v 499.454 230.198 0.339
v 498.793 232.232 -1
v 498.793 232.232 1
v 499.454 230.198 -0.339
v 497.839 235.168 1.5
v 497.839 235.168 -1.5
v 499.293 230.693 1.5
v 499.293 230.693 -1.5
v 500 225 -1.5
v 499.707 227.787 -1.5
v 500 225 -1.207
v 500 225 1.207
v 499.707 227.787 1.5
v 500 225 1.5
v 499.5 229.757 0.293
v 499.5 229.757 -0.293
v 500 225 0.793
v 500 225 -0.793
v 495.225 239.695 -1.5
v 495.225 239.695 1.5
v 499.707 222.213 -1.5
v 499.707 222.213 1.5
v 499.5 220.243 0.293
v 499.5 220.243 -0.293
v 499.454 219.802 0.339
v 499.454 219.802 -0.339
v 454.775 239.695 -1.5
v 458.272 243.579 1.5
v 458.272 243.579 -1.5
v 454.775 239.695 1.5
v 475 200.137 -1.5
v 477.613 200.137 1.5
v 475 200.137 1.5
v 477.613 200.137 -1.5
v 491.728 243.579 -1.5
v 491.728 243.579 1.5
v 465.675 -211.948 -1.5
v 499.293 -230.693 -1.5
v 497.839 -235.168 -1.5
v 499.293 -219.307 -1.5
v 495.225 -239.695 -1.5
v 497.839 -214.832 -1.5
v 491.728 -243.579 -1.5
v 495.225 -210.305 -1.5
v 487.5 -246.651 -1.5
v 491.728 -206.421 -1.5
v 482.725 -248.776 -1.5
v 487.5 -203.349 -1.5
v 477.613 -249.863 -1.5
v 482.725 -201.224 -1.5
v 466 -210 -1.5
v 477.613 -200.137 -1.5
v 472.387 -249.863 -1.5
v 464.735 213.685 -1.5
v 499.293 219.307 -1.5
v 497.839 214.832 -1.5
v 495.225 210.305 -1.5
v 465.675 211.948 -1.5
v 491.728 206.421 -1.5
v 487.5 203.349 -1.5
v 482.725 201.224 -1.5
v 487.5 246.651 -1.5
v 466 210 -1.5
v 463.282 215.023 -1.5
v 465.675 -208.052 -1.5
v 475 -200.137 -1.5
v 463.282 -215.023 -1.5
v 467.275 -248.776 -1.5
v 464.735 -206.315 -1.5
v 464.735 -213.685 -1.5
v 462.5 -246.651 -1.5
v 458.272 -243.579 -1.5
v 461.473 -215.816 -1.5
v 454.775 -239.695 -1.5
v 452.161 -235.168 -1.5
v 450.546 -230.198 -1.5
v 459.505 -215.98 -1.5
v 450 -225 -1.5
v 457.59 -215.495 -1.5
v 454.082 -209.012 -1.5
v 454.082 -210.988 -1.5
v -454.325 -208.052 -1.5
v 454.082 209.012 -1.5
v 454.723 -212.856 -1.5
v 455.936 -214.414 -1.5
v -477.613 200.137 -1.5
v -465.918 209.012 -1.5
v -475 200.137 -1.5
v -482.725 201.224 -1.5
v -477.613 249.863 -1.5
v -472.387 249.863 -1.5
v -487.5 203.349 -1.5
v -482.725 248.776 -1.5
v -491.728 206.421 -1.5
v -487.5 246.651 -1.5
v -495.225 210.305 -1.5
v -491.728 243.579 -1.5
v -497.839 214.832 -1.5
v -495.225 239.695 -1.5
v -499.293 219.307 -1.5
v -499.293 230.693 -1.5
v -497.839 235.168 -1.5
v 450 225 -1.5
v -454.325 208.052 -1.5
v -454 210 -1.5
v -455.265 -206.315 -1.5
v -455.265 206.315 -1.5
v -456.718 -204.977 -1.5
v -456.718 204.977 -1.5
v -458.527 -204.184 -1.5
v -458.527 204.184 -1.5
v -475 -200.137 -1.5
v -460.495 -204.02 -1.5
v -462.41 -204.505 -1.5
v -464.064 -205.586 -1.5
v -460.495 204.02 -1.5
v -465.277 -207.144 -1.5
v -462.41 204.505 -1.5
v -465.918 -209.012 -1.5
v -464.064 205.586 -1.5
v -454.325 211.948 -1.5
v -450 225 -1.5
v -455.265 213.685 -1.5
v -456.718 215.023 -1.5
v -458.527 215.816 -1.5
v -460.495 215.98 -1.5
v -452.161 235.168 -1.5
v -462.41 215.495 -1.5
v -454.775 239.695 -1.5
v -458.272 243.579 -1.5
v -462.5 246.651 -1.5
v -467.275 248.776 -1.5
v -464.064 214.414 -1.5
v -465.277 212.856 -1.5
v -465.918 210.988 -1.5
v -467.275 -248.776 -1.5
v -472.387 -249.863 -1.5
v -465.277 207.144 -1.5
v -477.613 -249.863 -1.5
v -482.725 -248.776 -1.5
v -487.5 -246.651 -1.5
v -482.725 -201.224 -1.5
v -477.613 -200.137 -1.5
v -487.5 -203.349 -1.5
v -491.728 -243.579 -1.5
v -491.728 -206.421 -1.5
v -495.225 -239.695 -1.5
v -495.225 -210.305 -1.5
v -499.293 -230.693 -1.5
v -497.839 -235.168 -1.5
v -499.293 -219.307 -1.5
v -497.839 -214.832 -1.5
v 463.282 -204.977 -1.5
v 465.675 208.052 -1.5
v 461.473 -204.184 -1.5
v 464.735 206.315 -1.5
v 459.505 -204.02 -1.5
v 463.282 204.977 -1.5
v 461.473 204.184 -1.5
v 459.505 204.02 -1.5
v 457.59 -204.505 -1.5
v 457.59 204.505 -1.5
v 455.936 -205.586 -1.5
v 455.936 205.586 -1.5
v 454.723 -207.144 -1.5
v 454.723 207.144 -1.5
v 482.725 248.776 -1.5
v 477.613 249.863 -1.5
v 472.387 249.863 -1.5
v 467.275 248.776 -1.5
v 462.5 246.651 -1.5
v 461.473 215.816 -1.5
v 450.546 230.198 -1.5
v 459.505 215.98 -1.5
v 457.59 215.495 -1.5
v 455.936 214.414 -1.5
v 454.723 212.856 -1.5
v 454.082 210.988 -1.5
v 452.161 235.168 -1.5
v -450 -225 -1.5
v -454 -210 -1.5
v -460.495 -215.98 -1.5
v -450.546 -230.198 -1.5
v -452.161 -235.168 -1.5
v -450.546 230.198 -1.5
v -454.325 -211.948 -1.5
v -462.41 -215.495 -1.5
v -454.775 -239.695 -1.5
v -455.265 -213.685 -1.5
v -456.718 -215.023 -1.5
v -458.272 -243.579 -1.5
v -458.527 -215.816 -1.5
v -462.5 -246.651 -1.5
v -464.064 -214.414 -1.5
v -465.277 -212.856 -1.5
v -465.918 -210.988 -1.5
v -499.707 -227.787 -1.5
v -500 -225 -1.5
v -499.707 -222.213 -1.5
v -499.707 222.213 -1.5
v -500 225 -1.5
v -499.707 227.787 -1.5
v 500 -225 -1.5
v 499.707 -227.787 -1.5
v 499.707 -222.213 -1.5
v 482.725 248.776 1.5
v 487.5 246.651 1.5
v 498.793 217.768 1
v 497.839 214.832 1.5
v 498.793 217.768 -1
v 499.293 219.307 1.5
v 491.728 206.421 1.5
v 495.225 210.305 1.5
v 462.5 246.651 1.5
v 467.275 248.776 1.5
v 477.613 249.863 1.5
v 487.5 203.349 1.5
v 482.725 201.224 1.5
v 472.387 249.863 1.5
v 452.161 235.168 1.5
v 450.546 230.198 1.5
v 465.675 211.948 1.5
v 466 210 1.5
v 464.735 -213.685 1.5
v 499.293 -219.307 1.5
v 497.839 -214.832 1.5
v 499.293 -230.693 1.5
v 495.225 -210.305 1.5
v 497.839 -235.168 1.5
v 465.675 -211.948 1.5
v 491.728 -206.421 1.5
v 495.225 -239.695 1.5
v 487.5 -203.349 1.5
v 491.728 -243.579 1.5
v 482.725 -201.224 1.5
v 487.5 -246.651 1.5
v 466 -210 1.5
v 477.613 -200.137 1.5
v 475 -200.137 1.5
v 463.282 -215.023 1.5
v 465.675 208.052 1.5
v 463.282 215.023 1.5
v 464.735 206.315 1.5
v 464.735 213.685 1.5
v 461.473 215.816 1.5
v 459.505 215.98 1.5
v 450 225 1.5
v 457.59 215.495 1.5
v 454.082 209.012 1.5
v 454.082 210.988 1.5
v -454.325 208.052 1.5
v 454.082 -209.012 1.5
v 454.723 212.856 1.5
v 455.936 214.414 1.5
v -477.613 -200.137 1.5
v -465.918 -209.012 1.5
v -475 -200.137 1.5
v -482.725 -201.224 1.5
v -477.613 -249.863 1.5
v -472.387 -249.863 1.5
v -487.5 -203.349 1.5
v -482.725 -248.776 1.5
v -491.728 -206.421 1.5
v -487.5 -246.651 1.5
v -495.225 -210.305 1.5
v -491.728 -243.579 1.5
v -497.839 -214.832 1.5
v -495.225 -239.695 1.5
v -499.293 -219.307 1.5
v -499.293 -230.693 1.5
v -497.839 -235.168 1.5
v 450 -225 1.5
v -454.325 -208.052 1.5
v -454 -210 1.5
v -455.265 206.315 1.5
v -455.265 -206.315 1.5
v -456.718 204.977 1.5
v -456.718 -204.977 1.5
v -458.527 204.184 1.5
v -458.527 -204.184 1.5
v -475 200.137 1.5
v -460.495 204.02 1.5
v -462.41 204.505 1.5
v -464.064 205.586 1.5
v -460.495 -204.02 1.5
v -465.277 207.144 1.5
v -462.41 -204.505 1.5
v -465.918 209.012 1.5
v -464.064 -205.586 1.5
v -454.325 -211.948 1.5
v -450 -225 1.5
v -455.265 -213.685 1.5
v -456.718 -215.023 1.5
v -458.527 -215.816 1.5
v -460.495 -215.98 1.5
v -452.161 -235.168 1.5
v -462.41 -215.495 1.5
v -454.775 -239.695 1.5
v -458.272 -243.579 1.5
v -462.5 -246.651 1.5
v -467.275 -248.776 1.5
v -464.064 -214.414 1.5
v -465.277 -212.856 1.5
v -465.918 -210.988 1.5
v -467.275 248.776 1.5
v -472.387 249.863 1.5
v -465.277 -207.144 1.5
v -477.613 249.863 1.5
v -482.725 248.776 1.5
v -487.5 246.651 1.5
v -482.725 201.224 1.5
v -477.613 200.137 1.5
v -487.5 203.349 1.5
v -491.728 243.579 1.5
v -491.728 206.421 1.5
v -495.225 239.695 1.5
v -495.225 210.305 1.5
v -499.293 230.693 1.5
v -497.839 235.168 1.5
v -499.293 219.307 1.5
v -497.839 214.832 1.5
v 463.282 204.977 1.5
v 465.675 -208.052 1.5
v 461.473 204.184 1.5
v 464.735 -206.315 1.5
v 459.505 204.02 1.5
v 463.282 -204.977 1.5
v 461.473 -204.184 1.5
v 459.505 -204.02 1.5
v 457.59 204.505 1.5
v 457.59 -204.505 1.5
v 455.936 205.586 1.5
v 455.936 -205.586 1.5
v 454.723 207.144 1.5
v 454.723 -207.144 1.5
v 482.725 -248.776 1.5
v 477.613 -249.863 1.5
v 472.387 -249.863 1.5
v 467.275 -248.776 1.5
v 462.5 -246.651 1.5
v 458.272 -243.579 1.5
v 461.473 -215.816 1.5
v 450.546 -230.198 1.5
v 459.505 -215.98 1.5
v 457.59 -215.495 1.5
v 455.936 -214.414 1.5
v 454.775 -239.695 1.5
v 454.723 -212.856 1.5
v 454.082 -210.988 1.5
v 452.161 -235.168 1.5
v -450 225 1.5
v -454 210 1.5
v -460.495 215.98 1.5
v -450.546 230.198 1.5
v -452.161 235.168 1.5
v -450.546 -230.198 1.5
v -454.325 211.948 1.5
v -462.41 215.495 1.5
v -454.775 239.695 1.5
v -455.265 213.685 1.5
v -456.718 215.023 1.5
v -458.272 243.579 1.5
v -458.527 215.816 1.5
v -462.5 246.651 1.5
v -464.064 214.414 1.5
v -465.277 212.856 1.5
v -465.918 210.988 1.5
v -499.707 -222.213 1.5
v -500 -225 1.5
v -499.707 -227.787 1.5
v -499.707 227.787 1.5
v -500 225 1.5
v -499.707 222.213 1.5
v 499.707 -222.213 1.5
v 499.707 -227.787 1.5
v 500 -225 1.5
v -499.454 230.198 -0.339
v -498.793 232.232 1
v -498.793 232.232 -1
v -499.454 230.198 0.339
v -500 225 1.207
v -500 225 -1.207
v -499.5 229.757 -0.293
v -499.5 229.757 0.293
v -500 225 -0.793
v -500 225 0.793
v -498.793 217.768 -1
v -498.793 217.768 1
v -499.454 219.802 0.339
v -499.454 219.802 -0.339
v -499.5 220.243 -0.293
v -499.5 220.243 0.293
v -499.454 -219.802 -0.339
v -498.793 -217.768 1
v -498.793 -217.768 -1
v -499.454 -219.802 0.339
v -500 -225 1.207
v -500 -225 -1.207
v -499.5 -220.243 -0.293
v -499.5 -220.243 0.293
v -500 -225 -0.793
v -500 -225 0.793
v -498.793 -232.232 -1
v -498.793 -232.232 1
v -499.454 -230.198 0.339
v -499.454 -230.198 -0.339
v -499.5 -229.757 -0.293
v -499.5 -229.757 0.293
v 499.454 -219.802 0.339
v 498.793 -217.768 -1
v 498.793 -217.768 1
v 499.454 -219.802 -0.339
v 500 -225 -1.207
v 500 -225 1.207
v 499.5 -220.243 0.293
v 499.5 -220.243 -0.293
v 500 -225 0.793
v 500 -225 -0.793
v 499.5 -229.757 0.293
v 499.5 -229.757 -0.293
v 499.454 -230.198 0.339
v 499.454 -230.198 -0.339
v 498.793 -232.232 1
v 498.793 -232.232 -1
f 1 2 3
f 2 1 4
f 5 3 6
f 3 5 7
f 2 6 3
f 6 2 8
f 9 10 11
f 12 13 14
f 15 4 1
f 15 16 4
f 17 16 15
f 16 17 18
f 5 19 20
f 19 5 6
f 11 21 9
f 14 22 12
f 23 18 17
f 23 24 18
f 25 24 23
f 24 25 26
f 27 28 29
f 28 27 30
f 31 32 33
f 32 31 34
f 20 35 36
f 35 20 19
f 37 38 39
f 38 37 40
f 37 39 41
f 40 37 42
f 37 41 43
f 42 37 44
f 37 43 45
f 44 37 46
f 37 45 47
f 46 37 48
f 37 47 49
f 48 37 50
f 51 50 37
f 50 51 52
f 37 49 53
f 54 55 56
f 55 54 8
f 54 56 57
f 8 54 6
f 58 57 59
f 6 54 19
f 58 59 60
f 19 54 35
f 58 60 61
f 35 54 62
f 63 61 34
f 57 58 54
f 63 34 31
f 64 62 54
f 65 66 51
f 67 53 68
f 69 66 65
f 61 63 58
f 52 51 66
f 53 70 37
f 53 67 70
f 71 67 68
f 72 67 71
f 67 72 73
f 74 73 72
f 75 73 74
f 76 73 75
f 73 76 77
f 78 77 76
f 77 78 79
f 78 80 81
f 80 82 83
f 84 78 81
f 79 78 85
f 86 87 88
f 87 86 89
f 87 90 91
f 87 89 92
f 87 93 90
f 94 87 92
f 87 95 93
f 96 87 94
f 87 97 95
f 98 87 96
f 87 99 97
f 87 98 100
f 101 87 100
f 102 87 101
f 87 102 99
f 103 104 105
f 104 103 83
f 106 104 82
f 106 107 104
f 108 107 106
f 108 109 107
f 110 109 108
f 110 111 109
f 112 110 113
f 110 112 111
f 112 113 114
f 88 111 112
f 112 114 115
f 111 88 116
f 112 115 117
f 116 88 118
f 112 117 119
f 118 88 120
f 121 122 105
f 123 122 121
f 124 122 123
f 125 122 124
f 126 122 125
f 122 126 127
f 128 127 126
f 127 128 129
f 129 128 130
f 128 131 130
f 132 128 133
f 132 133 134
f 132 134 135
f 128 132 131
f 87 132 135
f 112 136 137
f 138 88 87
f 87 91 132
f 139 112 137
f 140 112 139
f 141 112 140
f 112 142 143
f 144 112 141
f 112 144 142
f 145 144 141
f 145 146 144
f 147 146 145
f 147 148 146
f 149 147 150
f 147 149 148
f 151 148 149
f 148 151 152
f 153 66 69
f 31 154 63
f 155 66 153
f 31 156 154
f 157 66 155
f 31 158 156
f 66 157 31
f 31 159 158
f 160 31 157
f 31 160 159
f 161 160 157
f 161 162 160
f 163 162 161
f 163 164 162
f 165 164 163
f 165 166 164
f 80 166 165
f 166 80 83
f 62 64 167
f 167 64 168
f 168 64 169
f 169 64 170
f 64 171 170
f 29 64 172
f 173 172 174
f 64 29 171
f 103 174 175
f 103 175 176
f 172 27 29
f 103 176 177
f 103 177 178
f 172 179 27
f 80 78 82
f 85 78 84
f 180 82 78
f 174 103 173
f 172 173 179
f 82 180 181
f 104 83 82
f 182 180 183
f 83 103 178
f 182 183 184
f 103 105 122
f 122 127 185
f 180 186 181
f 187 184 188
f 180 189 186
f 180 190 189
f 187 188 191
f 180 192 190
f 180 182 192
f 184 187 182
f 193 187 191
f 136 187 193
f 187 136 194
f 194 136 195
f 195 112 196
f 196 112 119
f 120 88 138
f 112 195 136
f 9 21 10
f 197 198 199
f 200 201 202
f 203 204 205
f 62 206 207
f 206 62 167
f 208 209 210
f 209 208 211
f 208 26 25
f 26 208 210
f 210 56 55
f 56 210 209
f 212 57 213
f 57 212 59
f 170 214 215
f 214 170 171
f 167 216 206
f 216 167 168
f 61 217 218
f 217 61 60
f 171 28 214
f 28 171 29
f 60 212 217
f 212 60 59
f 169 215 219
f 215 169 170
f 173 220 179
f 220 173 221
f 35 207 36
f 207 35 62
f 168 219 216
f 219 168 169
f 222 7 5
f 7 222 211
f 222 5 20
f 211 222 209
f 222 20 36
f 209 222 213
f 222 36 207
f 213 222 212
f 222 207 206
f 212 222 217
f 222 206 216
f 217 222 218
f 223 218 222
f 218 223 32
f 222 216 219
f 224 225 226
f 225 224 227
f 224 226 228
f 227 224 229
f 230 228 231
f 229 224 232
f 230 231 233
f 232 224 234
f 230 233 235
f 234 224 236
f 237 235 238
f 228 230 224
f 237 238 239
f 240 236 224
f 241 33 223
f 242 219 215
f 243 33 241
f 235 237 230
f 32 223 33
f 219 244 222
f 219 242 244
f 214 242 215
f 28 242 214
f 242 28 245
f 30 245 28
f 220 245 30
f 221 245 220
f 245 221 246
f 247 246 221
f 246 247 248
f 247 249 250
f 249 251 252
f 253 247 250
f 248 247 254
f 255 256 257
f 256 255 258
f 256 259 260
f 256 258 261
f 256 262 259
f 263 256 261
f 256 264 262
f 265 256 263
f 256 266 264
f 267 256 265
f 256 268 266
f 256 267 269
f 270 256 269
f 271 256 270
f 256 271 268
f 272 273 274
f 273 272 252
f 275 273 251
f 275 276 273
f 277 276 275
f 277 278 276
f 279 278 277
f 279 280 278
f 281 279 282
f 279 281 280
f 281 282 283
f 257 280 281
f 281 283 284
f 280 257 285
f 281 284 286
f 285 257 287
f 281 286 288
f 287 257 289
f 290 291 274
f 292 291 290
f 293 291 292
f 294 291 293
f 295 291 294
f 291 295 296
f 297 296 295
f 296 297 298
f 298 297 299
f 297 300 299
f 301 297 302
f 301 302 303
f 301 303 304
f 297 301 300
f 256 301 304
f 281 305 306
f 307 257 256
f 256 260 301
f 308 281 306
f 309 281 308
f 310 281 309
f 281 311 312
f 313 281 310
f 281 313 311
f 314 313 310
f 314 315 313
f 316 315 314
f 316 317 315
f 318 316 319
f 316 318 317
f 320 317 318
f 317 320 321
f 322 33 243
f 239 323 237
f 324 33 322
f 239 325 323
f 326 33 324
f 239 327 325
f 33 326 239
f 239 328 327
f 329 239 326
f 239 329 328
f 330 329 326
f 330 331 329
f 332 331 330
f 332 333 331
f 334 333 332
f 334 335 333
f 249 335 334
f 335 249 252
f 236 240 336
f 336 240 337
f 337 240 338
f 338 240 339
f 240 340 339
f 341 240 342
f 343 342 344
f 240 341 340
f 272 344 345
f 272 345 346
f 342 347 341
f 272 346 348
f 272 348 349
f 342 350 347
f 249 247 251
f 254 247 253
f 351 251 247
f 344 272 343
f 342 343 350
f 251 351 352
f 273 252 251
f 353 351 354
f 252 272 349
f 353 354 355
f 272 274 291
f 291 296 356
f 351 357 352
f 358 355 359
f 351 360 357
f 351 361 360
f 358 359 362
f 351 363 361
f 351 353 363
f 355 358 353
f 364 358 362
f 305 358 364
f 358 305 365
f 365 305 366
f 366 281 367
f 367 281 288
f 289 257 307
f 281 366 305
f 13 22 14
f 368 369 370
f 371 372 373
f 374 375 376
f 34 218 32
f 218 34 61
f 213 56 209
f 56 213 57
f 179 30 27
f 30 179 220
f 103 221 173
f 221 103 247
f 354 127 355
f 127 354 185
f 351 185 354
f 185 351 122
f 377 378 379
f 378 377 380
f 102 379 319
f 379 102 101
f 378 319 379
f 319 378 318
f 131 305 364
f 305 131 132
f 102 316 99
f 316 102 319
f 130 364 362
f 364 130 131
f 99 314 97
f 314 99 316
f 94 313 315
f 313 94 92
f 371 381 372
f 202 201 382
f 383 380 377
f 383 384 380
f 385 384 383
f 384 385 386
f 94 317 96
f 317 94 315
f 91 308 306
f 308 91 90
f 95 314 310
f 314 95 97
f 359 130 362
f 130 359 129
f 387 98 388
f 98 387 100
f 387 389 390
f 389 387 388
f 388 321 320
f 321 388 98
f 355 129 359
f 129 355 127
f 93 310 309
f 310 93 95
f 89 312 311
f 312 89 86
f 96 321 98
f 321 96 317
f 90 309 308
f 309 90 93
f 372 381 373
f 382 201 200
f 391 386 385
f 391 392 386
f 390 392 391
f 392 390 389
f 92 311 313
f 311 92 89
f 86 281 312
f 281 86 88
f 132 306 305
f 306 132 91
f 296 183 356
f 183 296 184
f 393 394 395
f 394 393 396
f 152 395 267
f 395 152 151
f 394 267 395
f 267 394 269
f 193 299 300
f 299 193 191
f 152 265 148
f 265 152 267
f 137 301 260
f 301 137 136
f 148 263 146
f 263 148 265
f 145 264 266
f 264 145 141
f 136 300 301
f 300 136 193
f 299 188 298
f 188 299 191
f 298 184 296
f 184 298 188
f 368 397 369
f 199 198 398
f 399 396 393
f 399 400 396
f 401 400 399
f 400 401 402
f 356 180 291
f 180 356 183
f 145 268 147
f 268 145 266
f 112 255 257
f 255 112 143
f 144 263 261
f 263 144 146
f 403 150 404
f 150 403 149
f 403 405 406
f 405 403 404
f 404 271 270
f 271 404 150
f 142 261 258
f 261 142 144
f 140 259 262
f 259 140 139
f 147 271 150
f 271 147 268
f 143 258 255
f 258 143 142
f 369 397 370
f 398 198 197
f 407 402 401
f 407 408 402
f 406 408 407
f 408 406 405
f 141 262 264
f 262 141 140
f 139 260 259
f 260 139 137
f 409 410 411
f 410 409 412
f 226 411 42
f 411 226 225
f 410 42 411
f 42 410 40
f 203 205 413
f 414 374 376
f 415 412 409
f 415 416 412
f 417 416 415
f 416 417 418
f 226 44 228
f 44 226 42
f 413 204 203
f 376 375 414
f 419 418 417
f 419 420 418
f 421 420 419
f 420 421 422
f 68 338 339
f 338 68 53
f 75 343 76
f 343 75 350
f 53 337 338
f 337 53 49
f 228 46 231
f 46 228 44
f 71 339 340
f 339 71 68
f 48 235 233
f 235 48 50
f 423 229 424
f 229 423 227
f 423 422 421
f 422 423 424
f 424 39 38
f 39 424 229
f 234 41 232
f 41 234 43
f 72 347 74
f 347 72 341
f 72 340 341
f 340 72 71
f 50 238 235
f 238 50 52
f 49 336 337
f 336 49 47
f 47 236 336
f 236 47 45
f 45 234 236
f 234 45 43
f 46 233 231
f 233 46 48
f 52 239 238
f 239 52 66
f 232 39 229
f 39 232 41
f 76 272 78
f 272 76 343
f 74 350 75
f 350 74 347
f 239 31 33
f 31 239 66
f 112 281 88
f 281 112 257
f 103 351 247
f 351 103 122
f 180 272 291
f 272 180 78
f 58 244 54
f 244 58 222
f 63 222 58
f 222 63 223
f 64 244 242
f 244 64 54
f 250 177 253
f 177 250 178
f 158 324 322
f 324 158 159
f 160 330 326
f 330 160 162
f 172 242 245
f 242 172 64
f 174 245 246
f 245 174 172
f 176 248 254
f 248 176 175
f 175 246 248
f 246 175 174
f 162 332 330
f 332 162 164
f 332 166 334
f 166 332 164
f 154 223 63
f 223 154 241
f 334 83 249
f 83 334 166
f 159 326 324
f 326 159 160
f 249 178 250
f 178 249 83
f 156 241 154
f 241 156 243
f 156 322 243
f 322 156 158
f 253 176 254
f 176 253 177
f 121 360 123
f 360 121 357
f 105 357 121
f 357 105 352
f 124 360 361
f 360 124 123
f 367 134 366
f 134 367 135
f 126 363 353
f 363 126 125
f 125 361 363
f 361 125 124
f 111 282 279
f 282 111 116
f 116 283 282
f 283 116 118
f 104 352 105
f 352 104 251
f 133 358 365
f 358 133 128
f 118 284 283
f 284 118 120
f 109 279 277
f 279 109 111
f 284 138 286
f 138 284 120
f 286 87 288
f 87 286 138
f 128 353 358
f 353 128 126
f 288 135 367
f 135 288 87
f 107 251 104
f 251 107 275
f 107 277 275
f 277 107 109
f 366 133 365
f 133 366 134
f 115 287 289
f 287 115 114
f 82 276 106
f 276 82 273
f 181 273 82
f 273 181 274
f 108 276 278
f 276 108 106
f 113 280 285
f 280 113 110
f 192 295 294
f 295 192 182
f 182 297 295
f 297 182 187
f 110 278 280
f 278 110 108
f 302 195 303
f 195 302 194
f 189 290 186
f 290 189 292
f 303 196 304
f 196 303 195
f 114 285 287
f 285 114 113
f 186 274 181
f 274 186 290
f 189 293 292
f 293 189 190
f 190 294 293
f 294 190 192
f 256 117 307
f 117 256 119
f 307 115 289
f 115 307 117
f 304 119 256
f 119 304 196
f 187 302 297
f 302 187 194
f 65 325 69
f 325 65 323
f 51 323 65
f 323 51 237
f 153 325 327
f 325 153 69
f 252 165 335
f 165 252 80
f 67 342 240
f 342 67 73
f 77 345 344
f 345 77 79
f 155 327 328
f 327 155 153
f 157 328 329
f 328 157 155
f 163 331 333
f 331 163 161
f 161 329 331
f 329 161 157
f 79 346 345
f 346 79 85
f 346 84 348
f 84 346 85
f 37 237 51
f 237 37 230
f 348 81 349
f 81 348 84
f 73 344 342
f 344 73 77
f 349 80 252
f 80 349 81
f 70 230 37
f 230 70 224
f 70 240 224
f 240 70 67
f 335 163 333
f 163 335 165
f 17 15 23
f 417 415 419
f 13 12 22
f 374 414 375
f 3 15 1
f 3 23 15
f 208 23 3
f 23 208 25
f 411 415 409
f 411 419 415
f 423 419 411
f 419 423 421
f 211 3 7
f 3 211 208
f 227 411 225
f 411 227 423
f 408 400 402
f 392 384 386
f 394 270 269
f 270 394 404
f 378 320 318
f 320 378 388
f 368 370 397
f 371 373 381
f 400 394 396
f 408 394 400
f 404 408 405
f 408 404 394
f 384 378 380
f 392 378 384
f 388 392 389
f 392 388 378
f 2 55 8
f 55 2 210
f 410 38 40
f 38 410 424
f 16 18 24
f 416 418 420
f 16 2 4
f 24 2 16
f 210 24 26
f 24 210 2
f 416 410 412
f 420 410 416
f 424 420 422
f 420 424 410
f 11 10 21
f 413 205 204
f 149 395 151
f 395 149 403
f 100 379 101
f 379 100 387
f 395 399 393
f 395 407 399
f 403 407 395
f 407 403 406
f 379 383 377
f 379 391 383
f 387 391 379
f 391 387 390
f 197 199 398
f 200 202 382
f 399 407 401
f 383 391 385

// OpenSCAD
// Parameters
sheet_length = 1000; //[500:2000:1]
sheet_width = 500; //[250:1000:1]
sheet_thickness = 3; //[1.5:6:0.5]
corner_fillet_radius = 25; //[10:60:1]
mount_hole_diameter = 12; //[6:24:1]
mount_hole_edge_offset = 40; //[20:100:1]
edge_chamfer = 1; //[0.5:3:0.5]
overlap = 1; //[0.5:2:0.5]

// Base Shapes
module sheet_body_core() {
  cube([sheet_length - 2*corner_fillet_radius, sheet_width - 2*corner_fillet_radius, sheet_thickness], center=true);
}

module corner_cylinder(x, y) {
  translate([x, y, 0])
    cylinder(r=corner_fillet_radius, h=sheet_thickness, center=true);
}

module mount_hole(x, y) {
  translate([x, y, 0])
    cylinder(r=mount_hole_diameter/2, h=sheet_thickness + 2*overlap, center=true);
}

module chamfer_wedge(x, y, z, rx, ry, rz) {
  translate([x, y, z])
    rotate([rx, ry, rz])
      cube([edge_chamfer, sheet_width + 2*overlap, edge_chamfer], center=true);
}

// Operations
module corner_fillets() {
  union() {
    corner_cylinder(sheet_length/2 - corner_fillet_radius, sheet_width/2 - corner_fillet_radius);
    corner_cylinder(-sheet_length/2 + corner_fillet_radius, sheet_width/2 - corner_fillet_radius);
    corner_cylinder(-sheet_length/2 + corner_fillet_radius, -sheet_width/2 + corner_fillet_radius);
    corner_cylinder(sheet_length/2 - corner_fillet_radius, -sheet_width/2 + corner_fillet_radius);
  }
}

module sheet_body() {
  union() {
    sheet_body_core();
    corner_fillets();
  }
}

module mounting_holes() {
  union() {
    mount_hole(sheet_length/2 - mount_hole_edge_offset, sheet_width/2 - mount_hole_edge_offset);
    mount_hole(-sheet_length/2 + mount_hole_edge_offset, sheet_width/2 - mount_hole_edge_offset);
    mount_hole(-sheet_length/2 + mount_hole_edge_offset, -sheet_width/2 + mount_hole_edge_offset);
    mount_hole(sheet_length/2 - mount_hole_edge_offset, -sheet_width/2 + mount_hole_edge_offset);
  }
}

module edge_chamfer() {
  union() {
    chamfer_wedge(sheet_length/2 - edge_chamfer/2, 0, sheet_thickness/2 - edge_chamfer/2, 0, 45, 0);
    chamfer_wedge(-sheet_length/2 + edge_chamfer/2, 0, sheet_thickness/2 - edge_chamfer/2, 0, -45, 0);
    chamfer_wedge(0, sheet_width/2 - edge_chamfer/2, sheet_thickness/2 - edge_chamfer/2, 45, 0, 0);
    chamfer_wedge(0, -sheet_width/2 + edge_chamfer/2, sheet_thickness/2 - edge_chamfer/2, -45, 0, 0);
    chamfer_wedge(sheet_length/2 - edge_chamfer/2, 0, -sheet_thickness/2 + edge_chamfer/2, 0, -45, 0);
    chamfer_wedge(-sheet_length/2 + edge_chamfer/2, 0, -sheet_thickness/2 + edge_chamfer/2, 0, 45, 0);
    chamfer_wedge(0, sheet_width/2 - edge_chamfer/2, -sheet_thickness/2 + edge_chamfer/2, -45, 0, 0);
    chamfer_wedge(0, -sheet_width/2 + edge_chamfer/2, -sheet_thickness/2 + edge_chamfer/2, 45, 0, 0);
  }
}

// Final Output
difference() {
  sheet_body();
  mounting_holes();
  edge_chamfer();
}
